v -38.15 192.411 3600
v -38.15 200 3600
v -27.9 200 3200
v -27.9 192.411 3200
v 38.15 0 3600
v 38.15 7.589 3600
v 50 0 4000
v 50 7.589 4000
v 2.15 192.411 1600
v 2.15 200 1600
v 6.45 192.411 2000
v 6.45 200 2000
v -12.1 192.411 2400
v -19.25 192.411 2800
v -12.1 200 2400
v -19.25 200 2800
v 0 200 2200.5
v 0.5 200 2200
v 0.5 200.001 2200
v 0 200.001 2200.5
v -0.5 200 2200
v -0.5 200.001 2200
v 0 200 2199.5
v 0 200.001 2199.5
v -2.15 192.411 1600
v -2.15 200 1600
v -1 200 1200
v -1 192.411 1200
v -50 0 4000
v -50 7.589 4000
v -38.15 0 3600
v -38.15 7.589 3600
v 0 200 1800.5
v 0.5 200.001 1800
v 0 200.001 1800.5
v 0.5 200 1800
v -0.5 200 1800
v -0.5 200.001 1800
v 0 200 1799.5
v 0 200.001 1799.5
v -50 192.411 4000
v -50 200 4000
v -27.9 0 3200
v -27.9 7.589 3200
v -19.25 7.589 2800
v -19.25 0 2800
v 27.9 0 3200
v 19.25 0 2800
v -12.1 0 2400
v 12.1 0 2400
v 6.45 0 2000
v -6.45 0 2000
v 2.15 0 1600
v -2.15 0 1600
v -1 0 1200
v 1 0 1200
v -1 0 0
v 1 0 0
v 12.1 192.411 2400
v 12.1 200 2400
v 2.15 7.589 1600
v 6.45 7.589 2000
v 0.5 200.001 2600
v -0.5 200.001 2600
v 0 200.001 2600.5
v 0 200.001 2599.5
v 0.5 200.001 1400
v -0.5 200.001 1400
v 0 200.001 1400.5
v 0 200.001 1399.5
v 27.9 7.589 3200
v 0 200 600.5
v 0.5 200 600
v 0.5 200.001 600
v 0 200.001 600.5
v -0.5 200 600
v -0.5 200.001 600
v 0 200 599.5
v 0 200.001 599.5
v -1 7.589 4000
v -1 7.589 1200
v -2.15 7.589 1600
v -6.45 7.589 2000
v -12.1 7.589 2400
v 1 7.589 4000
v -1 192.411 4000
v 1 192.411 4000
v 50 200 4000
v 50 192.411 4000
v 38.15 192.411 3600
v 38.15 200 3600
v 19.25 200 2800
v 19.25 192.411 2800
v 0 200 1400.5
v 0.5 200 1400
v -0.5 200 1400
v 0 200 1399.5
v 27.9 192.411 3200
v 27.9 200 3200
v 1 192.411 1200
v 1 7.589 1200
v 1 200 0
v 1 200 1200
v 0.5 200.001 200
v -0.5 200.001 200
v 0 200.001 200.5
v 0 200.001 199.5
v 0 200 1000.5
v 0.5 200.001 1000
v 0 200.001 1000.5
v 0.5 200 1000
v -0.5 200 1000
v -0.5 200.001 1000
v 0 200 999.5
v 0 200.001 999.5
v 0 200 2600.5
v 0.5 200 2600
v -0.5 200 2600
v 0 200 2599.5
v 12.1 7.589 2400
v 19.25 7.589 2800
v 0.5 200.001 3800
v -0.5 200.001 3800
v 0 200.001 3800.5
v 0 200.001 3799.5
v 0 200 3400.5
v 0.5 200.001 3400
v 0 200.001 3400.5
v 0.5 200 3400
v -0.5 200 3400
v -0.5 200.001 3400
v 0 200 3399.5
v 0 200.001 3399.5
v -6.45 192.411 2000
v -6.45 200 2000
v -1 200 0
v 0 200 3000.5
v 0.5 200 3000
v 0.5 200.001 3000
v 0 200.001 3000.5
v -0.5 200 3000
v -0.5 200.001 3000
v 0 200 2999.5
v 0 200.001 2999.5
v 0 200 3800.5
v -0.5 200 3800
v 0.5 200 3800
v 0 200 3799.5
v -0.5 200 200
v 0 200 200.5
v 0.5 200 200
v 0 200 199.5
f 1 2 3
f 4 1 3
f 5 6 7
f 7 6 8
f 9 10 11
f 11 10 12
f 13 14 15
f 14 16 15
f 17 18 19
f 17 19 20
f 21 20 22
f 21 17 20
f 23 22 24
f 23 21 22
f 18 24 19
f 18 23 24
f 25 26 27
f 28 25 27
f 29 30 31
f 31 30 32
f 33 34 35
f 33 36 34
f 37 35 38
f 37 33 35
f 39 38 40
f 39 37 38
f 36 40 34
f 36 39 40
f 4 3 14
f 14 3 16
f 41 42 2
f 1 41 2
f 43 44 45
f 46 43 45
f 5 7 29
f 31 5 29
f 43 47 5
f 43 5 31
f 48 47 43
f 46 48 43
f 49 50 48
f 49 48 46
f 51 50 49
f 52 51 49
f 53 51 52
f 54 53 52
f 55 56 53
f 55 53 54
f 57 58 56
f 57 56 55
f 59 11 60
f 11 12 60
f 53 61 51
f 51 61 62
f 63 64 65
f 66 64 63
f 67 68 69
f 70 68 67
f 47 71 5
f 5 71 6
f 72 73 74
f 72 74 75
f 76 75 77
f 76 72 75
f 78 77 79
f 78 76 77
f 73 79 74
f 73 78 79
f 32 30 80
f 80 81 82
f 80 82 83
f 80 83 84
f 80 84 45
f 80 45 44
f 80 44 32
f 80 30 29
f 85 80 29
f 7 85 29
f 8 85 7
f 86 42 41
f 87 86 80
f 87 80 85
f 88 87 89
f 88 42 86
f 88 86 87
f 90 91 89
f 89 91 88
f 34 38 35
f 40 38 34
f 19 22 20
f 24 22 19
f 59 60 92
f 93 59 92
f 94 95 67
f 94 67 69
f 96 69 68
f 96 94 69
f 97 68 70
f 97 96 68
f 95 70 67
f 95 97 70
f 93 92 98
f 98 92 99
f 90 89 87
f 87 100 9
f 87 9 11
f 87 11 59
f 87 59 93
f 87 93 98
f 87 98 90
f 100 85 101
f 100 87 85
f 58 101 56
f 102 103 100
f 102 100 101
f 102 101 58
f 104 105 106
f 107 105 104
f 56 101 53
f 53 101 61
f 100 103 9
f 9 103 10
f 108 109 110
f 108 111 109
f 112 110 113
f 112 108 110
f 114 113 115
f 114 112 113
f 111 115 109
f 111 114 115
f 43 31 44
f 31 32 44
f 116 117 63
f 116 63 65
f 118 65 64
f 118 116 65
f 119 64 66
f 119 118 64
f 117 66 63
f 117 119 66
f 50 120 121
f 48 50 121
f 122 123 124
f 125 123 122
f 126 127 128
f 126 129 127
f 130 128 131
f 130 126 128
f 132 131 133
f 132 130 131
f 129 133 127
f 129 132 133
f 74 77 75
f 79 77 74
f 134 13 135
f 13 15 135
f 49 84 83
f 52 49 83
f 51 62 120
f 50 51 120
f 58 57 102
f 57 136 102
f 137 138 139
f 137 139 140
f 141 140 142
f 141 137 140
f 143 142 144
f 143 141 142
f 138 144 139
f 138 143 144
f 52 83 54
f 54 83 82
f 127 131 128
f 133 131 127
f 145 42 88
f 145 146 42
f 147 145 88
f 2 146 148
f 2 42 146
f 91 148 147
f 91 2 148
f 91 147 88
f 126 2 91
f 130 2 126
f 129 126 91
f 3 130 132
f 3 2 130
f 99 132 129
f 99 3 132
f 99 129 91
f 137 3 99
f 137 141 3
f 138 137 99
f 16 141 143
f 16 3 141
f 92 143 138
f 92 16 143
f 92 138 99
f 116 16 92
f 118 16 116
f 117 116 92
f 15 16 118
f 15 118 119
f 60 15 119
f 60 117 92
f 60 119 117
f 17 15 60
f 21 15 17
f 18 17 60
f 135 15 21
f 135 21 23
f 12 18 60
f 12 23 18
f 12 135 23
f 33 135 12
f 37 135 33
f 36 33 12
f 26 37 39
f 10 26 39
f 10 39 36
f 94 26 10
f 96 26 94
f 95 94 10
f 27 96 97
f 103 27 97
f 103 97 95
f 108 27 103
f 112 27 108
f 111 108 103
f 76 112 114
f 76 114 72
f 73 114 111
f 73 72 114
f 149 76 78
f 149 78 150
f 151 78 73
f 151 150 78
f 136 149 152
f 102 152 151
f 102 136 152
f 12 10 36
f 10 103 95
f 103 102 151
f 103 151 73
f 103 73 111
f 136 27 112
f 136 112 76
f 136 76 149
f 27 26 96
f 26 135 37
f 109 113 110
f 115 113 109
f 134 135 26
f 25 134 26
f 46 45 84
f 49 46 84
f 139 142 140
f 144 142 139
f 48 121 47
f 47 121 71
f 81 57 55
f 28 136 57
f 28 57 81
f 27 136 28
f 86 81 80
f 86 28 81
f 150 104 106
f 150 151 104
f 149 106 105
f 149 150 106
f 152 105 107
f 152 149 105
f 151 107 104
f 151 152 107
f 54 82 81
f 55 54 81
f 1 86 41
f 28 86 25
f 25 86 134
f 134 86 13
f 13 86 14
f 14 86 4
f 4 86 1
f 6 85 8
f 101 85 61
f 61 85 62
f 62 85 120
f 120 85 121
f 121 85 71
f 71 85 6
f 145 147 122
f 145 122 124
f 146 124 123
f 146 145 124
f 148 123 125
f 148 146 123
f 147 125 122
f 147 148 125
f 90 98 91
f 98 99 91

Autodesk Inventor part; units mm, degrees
ref_plane "YZ Plane" through (0, 0, 0) normal (1, 0, 0) x (0, 1, 0)
ref_plane "XZ Plane" through (0, 0, 0) normal (0, 1, 0) x (-1, 0, 0)
ref_plane "XY Plane" through (0, 0, 0) normal (0, 0, 1) x (1, 0, 0)
sketch "Sketch1" plane through (0, 0, 0) normal (0, 1, 0) x (-1, 0, 0)
  point P0 (0, 0)
sketch "Sketch2" plane through (0, 0, 0) normal (0, 0, 1) x (1, 0, 0)
  line L0 (-50, 200) -> (50, 200)
  line L1 (50, 200) -> (50, 0)
  line L2 (50, 0) -> (-50, 0)
  line L3 (-50, 0) -> (-50, 200)
  line L4 (-50, 192.411) -> (-1, 192.411)
  line L5 (-1, 192.411) -> (-1, 7.589)
  line L6 (-1, 7.589) -> (-50, 7.589)
  line L7 (-50, 7.589) -> (-50, 192.411)
  line L8 (50, 192.411) -> (1, 192.411)
  line L9 (1, 192.411) -> (1, 7.589)
  line L10 (1, 7.589) -> (50, 7.589)
  line L11 (50, 7.589) -> (50, 192.411)
  point P0 (0, 0)
  point P1 (0, 0)
  dimension "d0" = 100
  dimension "d1" = 2
  dimension "d2" = 7.589
  dimension "d3" = 7.589
  dimension "d4" = 200
extrude "Extrusion1" add sketch "Sketch2" along normal blind 4000 contours L0 L1 L8 L9 L10 L2 L3 L6 L5 L4
sketch "Sketch5" plane through (-50, 200, 0) normal (0, 1, 0) x (1, 0, 0)
  line L0 (100, -3600) -> (100, -3200)
  line L1 (100, 0) -> (100, -4000) projected
  line L2 (100, 0) -> (100, -4000) projected
  line L3 (100, -4000) -> (100, -3600)
  line L4 (100, -4000) -> (0, -4000) projected
  line L5 (100, -3600) -> (100, -3200)
  line L6 (100, -3200) -> (100, -2800)
  line L7 (69.25, -2800) -> (77.9, -3200)
  line L8 (100, -2800) -> (100, -2400)
  line L9 (62.1, -2400) -> (69.25, -2800)
  line L10 (88.15, -3600) -> (100, -4000)
  line L11 (77.9, -3200) -> (88.15, -3600)
  line L12 (100, -2400) -> (100, -2000)
  line L13 (100, -2000) -> (100, -1600)
  line L14 (56.45, -2000) -> (62.1, -2400)
  line L15 (52.15, -1600) -> (56.45, -2000)
  line L16 (100, -1600) -> (100, -1200)
  line L17 (100, -1200) -> (100, -800)
  line L18 (100, -800) -> (100, -400)
  line L19 (100, -400) -> (100, 0)
  line L20 (100, 0) -> (0, 0) projected
  line L21 (49, 0) -> (49, -4000) projected
  line L22 (51, -1200) -> (52.15, -1600)
  line L23 (51, -800) -> (51, -1200)
  line L24 (51, -400) -> (51, -800)
  line L25 (100, 0) -> (51, 0)
  line L26 (51, -400) -> (51, 0)
  point P0 (50, 0)
  dimension "d23" = 400
  dimension "d25" = 400
  dimension "d27" = 400
  dimension "d28" = 30.75
  dimension "d29" = 400
  dimension "d30" = 37.9
  dimension "d31" = 11.85
  dimension "d32" = 22.1
  dimension "d33" = 400
  dimension "d34" = 400
  dimension "d35" = 43.55
  dimension "d37" = 400
  dimension "d38" = 400
  dimension "d39" = 400
  dimension "d40" = 400
  dimension "d43" = 47.85
  dimension "d44" = 49
  dimension "d45" = 49
  dimension "d46" = 49
  dimension "d47" = 49
extrude "Extrusion4" cut sketch "Sketch5" against normal blind 1000 contours L1 L10 L11 L7 L9 L14 L15 L22 L23 L24 L26 L20 L0
split "Split1" plane through (0, 0, 0) removes the side toward (-1, 0, 0)
mirror "Mirror1" about plane through (0, 0, 0) normal (1, 0, 0)
sketch "Sketch6" plane through (1, 200, 1200) normal (0, 1, 0) x (1, 0, 0)
  line L0 (-51, -2800) -> (49, -2800) projected
  line L1 (-51, -2800) -> (-1, -2800)
  line L2 (-1, -2800) -> (-1, -2600)
  circle A0 centre (-1, -2600) radius 0.5
  point P0 (-1, 1200)
  dimension "d50" = 200
  dimension "d51" = 1
extrude "Extrusion5" add sketch "Sketch6" along normal blind 0.001
pattern_linear "Rectangular Pattern1" count 10 spacing 400 along (0, 0, -1) of "Extrusion5"
equation "\"d3\" = d2"
properties material "Aluminum 2014-T6"
